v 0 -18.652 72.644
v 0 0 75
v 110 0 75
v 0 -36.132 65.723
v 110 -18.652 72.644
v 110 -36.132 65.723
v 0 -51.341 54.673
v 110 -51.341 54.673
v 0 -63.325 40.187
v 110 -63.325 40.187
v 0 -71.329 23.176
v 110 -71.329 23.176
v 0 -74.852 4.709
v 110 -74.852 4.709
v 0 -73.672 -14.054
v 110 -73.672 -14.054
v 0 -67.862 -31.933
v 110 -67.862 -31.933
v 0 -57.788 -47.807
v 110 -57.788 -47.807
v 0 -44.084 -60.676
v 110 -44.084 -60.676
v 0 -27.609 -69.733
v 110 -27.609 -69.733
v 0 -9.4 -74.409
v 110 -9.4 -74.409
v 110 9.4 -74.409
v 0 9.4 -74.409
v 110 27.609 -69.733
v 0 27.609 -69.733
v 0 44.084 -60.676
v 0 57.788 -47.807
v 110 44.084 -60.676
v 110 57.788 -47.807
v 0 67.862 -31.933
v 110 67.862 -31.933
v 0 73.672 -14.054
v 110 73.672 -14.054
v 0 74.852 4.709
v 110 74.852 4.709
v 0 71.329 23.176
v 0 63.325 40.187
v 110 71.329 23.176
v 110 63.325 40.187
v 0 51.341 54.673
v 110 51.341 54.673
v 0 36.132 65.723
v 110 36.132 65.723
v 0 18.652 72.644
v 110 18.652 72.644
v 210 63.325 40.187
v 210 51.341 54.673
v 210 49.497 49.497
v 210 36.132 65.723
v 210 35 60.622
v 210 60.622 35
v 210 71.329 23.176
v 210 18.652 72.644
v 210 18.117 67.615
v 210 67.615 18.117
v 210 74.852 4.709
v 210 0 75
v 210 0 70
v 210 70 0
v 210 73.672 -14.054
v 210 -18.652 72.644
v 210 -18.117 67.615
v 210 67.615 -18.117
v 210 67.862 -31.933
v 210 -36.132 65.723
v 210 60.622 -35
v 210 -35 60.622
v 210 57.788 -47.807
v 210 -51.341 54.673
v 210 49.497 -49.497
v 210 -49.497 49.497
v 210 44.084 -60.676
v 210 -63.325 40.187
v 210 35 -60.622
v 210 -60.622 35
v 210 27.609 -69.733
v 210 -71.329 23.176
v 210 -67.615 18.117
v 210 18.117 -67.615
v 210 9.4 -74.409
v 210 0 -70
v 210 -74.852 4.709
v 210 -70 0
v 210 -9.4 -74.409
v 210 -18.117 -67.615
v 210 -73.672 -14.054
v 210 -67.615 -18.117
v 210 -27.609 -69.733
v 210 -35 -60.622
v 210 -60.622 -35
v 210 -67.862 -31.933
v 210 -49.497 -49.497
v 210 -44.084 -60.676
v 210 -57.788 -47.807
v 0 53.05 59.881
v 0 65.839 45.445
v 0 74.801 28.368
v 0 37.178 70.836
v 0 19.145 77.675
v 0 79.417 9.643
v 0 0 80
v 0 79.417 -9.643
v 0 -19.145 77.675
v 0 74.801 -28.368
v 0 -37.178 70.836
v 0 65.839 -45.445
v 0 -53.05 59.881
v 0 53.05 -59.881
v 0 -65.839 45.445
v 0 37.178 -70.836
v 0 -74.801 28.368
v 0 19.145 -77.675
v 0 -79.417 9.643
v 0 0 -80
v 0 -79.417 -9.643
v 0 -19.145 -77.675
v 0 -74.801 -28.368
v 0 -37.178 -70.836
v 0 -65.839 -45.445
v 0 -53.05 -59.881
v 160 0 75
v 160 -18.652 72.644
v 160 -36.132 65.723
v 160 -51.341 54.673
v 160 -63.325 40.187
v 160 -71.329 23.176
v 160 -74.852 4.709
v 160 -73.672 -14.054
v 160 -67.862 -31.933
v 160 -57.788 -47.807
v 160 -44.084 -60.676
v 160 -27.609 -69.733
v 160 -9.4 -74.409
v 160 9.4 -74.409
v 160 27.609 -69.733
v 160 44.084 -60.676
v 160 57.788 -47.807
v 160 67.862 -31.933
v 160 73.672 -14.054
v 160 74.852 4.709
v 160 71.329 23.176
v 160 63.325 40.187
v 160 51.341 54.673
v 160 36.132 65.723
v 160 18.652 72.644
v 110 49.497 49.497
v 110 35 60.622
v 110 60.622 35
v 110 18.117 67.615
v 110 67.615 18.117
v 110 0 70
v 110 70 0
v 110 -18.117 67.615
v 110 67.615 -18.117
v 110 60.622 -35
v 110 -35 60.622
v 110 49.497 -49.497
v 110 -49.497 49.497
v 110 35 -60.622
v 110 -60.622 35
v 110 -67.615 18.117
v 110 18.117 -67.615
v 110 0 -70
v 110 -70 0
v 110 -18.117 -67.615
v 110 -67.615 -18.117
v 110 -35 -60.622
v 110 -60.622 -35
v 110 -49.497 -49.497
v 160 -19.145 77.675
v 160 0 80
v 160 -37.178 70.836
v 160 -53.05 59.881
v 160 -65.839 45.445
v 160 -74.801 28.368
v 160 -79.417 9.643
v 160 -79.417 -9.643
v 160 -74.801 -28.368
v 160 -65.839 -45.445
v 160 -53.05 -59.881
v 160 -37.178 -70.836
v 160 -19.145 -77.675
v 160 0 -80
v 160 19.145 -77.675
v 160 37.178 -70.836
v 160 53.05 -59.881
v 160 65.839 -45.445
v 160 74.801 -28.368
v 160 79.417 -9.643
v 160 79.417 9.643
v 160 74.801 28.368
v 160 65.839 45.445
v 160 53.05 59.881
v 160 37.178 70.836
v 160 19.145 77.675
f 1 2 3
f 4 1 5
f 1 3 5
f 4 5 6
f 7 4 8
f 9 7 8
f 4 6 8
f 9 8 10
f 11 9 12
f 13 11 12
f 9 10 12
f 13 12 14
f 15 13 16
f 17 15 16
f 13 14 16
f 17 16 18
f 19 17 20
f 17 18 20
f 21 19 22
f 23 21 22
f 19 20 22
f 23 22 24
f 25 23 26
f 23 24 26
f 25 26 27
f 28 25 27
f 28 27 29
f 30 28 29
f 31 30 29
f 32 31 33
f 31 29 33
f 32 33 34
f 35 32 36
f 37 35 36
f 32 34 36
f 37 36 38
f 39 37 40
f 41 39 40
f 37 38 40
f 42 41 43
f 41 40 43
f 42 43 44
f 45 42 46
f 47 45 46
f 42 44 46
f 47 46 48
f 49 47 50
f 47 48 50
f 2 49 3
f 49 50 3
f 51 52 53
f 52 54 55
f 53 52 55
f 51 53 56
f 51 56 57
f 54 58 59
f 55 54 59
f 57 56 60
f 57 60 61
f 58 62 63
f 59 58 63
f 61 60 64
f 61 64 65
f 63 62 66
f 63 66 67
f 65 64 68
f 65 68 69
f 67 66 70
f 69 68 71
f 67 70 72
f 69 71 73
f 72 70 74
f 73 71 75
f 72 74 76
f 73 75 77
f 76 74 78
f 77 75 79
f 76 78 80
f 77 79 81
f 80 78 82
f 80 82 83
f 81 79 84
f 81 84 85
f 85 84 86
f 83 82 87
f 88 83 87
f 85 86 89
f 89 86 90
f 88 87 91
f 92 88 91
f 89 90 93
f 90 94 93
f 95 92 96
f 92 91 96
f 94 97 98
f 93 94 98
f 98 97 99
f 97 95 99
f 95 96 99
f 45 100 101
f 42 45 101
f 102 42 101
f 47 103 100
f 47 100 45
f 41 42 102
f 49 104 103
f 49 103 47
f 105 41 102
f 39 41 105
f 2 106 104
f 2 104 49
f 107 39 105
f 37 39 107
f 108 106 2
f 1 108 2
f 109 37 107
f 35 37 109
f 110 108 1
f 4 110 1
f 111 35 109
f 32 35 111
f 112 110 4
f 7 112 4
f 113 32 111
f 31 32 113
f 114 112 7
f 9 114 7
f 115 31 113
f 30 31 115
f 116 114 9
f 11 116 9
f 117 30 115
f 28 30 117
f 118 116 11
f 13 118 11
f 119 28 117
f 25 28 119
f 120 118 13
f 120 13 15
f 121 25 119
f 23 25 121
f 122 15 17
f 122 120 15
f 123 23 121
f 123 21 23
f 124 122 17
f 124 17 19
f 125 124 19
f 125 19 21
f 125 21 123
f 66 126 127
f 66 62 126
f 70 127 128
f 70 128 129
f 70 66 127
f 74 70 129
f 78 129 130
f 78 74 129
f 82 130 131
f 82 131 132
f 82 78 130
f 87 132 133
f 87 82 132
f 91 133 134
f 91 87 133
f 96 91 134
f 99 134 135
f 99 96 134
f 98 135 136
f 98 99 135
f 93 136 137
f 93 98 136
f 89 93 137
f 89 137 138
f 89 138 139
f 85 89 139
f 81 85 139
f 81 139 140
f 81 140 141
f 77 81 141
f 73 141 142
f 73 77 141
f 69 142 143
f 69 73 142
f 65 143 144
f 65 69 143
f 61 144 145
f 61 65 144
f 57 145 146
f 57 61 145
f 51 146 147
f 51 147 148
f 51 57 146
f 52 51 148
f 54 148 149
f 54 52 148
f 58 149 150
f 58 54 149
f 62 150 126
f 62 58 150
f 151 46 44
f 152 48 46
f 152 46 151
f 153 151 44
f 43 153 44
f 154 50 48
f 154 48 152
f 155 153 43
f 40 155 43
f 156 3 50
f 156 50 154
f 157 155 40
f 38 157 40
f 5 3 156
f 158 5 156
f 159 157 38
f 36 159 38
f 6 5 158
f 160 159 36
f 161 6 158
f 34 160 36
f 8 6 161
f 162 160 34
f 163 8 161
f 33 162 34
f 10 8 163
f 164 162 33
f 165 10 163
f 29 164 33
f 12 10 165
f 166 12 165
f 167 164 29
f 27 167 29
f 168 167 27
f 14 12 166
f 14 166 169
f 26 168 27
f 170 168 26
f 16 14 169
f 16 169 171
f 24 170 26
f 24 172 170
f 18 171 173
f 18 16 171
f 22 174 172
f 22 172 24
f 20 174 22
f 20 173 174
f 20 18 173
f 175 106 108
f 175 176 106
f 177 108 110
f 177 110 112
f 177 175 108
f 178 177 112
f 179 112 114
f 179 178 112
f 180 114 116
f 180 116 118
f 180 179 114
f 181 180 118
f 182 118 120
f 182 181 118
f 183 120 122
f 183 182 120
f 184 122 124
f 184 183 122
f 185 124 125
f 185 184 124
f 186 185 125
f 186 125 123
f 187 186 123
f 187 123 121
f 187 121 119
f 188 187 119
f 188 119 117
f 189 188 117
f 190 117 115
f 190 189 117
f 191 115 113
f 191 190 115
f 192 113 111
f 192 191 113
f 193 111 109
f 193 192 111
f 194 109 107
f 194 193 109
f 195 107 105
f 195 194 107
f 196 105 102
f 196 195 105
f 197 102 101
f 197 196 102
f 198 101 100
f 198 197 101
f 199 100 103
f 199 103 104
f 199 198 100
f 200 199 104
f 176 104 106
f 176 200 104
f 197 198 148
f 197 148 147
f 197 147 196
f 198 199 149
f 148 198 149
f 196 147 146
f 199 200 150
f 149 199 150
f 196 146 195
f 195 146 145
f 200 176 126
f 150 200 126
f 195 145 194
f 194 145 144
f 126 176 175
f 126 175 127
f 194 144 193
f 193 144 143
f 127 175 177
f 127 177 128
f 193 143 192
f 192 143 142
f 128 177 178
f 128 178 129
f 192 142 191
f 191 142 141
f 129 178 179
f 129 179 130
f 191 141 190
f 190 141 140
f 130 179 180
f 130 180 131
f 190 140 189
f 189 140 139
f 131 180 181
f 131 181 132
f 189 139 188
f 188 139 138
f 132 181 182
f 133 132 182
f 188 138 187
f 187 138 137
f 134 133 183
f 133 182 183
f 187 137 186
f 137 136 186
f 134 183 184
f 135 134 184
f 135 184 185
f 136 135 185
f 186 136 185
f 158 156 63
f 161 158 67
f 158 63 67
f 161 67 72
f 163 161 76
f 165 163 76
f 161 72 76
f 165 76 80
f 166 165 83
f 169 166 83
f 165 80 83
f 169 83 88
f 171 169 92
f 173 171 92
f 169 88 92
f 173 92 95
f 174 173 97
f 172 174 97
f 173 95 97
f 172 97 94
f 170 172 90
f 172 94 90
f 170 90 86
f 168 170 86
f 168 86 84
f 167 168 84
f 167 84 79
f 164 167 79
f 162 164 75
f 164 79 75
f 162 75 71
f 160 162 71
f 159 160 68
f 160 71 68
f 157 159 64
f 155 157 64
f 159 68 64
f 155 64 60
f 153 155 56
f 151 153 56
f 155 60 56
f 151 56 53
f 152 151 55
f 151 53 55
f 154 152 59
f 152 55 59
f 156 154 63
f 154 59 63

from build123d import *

# Parameters (mm, degrees)
SKIZZE1_W   = 160
SKIZZE1_H   = 5
SKIZZE1_W_2 = 100


with BuildPart() as part:
    # Skizze1 → Rotation1 (revolve)
    with BuildSketch(Plane.XY, mode=Mode.PRIVATE) as rotation1_sk:
        with Locations((80, 77.5)):
            Rectangle(SKIZZE1_W, SKIZZE1_H)
        with Locations((160, 72.5)):
            Rectangle(SKIZZE1_W_2, SKIZZE1_H)
    revolve(rotation1_sk.sketch.rotate(Axis((0, 0, 0), (1, 0, 0)), 90), axis=Axis((0, 0, 0), (1, 0, 0)))


solid = part.part
